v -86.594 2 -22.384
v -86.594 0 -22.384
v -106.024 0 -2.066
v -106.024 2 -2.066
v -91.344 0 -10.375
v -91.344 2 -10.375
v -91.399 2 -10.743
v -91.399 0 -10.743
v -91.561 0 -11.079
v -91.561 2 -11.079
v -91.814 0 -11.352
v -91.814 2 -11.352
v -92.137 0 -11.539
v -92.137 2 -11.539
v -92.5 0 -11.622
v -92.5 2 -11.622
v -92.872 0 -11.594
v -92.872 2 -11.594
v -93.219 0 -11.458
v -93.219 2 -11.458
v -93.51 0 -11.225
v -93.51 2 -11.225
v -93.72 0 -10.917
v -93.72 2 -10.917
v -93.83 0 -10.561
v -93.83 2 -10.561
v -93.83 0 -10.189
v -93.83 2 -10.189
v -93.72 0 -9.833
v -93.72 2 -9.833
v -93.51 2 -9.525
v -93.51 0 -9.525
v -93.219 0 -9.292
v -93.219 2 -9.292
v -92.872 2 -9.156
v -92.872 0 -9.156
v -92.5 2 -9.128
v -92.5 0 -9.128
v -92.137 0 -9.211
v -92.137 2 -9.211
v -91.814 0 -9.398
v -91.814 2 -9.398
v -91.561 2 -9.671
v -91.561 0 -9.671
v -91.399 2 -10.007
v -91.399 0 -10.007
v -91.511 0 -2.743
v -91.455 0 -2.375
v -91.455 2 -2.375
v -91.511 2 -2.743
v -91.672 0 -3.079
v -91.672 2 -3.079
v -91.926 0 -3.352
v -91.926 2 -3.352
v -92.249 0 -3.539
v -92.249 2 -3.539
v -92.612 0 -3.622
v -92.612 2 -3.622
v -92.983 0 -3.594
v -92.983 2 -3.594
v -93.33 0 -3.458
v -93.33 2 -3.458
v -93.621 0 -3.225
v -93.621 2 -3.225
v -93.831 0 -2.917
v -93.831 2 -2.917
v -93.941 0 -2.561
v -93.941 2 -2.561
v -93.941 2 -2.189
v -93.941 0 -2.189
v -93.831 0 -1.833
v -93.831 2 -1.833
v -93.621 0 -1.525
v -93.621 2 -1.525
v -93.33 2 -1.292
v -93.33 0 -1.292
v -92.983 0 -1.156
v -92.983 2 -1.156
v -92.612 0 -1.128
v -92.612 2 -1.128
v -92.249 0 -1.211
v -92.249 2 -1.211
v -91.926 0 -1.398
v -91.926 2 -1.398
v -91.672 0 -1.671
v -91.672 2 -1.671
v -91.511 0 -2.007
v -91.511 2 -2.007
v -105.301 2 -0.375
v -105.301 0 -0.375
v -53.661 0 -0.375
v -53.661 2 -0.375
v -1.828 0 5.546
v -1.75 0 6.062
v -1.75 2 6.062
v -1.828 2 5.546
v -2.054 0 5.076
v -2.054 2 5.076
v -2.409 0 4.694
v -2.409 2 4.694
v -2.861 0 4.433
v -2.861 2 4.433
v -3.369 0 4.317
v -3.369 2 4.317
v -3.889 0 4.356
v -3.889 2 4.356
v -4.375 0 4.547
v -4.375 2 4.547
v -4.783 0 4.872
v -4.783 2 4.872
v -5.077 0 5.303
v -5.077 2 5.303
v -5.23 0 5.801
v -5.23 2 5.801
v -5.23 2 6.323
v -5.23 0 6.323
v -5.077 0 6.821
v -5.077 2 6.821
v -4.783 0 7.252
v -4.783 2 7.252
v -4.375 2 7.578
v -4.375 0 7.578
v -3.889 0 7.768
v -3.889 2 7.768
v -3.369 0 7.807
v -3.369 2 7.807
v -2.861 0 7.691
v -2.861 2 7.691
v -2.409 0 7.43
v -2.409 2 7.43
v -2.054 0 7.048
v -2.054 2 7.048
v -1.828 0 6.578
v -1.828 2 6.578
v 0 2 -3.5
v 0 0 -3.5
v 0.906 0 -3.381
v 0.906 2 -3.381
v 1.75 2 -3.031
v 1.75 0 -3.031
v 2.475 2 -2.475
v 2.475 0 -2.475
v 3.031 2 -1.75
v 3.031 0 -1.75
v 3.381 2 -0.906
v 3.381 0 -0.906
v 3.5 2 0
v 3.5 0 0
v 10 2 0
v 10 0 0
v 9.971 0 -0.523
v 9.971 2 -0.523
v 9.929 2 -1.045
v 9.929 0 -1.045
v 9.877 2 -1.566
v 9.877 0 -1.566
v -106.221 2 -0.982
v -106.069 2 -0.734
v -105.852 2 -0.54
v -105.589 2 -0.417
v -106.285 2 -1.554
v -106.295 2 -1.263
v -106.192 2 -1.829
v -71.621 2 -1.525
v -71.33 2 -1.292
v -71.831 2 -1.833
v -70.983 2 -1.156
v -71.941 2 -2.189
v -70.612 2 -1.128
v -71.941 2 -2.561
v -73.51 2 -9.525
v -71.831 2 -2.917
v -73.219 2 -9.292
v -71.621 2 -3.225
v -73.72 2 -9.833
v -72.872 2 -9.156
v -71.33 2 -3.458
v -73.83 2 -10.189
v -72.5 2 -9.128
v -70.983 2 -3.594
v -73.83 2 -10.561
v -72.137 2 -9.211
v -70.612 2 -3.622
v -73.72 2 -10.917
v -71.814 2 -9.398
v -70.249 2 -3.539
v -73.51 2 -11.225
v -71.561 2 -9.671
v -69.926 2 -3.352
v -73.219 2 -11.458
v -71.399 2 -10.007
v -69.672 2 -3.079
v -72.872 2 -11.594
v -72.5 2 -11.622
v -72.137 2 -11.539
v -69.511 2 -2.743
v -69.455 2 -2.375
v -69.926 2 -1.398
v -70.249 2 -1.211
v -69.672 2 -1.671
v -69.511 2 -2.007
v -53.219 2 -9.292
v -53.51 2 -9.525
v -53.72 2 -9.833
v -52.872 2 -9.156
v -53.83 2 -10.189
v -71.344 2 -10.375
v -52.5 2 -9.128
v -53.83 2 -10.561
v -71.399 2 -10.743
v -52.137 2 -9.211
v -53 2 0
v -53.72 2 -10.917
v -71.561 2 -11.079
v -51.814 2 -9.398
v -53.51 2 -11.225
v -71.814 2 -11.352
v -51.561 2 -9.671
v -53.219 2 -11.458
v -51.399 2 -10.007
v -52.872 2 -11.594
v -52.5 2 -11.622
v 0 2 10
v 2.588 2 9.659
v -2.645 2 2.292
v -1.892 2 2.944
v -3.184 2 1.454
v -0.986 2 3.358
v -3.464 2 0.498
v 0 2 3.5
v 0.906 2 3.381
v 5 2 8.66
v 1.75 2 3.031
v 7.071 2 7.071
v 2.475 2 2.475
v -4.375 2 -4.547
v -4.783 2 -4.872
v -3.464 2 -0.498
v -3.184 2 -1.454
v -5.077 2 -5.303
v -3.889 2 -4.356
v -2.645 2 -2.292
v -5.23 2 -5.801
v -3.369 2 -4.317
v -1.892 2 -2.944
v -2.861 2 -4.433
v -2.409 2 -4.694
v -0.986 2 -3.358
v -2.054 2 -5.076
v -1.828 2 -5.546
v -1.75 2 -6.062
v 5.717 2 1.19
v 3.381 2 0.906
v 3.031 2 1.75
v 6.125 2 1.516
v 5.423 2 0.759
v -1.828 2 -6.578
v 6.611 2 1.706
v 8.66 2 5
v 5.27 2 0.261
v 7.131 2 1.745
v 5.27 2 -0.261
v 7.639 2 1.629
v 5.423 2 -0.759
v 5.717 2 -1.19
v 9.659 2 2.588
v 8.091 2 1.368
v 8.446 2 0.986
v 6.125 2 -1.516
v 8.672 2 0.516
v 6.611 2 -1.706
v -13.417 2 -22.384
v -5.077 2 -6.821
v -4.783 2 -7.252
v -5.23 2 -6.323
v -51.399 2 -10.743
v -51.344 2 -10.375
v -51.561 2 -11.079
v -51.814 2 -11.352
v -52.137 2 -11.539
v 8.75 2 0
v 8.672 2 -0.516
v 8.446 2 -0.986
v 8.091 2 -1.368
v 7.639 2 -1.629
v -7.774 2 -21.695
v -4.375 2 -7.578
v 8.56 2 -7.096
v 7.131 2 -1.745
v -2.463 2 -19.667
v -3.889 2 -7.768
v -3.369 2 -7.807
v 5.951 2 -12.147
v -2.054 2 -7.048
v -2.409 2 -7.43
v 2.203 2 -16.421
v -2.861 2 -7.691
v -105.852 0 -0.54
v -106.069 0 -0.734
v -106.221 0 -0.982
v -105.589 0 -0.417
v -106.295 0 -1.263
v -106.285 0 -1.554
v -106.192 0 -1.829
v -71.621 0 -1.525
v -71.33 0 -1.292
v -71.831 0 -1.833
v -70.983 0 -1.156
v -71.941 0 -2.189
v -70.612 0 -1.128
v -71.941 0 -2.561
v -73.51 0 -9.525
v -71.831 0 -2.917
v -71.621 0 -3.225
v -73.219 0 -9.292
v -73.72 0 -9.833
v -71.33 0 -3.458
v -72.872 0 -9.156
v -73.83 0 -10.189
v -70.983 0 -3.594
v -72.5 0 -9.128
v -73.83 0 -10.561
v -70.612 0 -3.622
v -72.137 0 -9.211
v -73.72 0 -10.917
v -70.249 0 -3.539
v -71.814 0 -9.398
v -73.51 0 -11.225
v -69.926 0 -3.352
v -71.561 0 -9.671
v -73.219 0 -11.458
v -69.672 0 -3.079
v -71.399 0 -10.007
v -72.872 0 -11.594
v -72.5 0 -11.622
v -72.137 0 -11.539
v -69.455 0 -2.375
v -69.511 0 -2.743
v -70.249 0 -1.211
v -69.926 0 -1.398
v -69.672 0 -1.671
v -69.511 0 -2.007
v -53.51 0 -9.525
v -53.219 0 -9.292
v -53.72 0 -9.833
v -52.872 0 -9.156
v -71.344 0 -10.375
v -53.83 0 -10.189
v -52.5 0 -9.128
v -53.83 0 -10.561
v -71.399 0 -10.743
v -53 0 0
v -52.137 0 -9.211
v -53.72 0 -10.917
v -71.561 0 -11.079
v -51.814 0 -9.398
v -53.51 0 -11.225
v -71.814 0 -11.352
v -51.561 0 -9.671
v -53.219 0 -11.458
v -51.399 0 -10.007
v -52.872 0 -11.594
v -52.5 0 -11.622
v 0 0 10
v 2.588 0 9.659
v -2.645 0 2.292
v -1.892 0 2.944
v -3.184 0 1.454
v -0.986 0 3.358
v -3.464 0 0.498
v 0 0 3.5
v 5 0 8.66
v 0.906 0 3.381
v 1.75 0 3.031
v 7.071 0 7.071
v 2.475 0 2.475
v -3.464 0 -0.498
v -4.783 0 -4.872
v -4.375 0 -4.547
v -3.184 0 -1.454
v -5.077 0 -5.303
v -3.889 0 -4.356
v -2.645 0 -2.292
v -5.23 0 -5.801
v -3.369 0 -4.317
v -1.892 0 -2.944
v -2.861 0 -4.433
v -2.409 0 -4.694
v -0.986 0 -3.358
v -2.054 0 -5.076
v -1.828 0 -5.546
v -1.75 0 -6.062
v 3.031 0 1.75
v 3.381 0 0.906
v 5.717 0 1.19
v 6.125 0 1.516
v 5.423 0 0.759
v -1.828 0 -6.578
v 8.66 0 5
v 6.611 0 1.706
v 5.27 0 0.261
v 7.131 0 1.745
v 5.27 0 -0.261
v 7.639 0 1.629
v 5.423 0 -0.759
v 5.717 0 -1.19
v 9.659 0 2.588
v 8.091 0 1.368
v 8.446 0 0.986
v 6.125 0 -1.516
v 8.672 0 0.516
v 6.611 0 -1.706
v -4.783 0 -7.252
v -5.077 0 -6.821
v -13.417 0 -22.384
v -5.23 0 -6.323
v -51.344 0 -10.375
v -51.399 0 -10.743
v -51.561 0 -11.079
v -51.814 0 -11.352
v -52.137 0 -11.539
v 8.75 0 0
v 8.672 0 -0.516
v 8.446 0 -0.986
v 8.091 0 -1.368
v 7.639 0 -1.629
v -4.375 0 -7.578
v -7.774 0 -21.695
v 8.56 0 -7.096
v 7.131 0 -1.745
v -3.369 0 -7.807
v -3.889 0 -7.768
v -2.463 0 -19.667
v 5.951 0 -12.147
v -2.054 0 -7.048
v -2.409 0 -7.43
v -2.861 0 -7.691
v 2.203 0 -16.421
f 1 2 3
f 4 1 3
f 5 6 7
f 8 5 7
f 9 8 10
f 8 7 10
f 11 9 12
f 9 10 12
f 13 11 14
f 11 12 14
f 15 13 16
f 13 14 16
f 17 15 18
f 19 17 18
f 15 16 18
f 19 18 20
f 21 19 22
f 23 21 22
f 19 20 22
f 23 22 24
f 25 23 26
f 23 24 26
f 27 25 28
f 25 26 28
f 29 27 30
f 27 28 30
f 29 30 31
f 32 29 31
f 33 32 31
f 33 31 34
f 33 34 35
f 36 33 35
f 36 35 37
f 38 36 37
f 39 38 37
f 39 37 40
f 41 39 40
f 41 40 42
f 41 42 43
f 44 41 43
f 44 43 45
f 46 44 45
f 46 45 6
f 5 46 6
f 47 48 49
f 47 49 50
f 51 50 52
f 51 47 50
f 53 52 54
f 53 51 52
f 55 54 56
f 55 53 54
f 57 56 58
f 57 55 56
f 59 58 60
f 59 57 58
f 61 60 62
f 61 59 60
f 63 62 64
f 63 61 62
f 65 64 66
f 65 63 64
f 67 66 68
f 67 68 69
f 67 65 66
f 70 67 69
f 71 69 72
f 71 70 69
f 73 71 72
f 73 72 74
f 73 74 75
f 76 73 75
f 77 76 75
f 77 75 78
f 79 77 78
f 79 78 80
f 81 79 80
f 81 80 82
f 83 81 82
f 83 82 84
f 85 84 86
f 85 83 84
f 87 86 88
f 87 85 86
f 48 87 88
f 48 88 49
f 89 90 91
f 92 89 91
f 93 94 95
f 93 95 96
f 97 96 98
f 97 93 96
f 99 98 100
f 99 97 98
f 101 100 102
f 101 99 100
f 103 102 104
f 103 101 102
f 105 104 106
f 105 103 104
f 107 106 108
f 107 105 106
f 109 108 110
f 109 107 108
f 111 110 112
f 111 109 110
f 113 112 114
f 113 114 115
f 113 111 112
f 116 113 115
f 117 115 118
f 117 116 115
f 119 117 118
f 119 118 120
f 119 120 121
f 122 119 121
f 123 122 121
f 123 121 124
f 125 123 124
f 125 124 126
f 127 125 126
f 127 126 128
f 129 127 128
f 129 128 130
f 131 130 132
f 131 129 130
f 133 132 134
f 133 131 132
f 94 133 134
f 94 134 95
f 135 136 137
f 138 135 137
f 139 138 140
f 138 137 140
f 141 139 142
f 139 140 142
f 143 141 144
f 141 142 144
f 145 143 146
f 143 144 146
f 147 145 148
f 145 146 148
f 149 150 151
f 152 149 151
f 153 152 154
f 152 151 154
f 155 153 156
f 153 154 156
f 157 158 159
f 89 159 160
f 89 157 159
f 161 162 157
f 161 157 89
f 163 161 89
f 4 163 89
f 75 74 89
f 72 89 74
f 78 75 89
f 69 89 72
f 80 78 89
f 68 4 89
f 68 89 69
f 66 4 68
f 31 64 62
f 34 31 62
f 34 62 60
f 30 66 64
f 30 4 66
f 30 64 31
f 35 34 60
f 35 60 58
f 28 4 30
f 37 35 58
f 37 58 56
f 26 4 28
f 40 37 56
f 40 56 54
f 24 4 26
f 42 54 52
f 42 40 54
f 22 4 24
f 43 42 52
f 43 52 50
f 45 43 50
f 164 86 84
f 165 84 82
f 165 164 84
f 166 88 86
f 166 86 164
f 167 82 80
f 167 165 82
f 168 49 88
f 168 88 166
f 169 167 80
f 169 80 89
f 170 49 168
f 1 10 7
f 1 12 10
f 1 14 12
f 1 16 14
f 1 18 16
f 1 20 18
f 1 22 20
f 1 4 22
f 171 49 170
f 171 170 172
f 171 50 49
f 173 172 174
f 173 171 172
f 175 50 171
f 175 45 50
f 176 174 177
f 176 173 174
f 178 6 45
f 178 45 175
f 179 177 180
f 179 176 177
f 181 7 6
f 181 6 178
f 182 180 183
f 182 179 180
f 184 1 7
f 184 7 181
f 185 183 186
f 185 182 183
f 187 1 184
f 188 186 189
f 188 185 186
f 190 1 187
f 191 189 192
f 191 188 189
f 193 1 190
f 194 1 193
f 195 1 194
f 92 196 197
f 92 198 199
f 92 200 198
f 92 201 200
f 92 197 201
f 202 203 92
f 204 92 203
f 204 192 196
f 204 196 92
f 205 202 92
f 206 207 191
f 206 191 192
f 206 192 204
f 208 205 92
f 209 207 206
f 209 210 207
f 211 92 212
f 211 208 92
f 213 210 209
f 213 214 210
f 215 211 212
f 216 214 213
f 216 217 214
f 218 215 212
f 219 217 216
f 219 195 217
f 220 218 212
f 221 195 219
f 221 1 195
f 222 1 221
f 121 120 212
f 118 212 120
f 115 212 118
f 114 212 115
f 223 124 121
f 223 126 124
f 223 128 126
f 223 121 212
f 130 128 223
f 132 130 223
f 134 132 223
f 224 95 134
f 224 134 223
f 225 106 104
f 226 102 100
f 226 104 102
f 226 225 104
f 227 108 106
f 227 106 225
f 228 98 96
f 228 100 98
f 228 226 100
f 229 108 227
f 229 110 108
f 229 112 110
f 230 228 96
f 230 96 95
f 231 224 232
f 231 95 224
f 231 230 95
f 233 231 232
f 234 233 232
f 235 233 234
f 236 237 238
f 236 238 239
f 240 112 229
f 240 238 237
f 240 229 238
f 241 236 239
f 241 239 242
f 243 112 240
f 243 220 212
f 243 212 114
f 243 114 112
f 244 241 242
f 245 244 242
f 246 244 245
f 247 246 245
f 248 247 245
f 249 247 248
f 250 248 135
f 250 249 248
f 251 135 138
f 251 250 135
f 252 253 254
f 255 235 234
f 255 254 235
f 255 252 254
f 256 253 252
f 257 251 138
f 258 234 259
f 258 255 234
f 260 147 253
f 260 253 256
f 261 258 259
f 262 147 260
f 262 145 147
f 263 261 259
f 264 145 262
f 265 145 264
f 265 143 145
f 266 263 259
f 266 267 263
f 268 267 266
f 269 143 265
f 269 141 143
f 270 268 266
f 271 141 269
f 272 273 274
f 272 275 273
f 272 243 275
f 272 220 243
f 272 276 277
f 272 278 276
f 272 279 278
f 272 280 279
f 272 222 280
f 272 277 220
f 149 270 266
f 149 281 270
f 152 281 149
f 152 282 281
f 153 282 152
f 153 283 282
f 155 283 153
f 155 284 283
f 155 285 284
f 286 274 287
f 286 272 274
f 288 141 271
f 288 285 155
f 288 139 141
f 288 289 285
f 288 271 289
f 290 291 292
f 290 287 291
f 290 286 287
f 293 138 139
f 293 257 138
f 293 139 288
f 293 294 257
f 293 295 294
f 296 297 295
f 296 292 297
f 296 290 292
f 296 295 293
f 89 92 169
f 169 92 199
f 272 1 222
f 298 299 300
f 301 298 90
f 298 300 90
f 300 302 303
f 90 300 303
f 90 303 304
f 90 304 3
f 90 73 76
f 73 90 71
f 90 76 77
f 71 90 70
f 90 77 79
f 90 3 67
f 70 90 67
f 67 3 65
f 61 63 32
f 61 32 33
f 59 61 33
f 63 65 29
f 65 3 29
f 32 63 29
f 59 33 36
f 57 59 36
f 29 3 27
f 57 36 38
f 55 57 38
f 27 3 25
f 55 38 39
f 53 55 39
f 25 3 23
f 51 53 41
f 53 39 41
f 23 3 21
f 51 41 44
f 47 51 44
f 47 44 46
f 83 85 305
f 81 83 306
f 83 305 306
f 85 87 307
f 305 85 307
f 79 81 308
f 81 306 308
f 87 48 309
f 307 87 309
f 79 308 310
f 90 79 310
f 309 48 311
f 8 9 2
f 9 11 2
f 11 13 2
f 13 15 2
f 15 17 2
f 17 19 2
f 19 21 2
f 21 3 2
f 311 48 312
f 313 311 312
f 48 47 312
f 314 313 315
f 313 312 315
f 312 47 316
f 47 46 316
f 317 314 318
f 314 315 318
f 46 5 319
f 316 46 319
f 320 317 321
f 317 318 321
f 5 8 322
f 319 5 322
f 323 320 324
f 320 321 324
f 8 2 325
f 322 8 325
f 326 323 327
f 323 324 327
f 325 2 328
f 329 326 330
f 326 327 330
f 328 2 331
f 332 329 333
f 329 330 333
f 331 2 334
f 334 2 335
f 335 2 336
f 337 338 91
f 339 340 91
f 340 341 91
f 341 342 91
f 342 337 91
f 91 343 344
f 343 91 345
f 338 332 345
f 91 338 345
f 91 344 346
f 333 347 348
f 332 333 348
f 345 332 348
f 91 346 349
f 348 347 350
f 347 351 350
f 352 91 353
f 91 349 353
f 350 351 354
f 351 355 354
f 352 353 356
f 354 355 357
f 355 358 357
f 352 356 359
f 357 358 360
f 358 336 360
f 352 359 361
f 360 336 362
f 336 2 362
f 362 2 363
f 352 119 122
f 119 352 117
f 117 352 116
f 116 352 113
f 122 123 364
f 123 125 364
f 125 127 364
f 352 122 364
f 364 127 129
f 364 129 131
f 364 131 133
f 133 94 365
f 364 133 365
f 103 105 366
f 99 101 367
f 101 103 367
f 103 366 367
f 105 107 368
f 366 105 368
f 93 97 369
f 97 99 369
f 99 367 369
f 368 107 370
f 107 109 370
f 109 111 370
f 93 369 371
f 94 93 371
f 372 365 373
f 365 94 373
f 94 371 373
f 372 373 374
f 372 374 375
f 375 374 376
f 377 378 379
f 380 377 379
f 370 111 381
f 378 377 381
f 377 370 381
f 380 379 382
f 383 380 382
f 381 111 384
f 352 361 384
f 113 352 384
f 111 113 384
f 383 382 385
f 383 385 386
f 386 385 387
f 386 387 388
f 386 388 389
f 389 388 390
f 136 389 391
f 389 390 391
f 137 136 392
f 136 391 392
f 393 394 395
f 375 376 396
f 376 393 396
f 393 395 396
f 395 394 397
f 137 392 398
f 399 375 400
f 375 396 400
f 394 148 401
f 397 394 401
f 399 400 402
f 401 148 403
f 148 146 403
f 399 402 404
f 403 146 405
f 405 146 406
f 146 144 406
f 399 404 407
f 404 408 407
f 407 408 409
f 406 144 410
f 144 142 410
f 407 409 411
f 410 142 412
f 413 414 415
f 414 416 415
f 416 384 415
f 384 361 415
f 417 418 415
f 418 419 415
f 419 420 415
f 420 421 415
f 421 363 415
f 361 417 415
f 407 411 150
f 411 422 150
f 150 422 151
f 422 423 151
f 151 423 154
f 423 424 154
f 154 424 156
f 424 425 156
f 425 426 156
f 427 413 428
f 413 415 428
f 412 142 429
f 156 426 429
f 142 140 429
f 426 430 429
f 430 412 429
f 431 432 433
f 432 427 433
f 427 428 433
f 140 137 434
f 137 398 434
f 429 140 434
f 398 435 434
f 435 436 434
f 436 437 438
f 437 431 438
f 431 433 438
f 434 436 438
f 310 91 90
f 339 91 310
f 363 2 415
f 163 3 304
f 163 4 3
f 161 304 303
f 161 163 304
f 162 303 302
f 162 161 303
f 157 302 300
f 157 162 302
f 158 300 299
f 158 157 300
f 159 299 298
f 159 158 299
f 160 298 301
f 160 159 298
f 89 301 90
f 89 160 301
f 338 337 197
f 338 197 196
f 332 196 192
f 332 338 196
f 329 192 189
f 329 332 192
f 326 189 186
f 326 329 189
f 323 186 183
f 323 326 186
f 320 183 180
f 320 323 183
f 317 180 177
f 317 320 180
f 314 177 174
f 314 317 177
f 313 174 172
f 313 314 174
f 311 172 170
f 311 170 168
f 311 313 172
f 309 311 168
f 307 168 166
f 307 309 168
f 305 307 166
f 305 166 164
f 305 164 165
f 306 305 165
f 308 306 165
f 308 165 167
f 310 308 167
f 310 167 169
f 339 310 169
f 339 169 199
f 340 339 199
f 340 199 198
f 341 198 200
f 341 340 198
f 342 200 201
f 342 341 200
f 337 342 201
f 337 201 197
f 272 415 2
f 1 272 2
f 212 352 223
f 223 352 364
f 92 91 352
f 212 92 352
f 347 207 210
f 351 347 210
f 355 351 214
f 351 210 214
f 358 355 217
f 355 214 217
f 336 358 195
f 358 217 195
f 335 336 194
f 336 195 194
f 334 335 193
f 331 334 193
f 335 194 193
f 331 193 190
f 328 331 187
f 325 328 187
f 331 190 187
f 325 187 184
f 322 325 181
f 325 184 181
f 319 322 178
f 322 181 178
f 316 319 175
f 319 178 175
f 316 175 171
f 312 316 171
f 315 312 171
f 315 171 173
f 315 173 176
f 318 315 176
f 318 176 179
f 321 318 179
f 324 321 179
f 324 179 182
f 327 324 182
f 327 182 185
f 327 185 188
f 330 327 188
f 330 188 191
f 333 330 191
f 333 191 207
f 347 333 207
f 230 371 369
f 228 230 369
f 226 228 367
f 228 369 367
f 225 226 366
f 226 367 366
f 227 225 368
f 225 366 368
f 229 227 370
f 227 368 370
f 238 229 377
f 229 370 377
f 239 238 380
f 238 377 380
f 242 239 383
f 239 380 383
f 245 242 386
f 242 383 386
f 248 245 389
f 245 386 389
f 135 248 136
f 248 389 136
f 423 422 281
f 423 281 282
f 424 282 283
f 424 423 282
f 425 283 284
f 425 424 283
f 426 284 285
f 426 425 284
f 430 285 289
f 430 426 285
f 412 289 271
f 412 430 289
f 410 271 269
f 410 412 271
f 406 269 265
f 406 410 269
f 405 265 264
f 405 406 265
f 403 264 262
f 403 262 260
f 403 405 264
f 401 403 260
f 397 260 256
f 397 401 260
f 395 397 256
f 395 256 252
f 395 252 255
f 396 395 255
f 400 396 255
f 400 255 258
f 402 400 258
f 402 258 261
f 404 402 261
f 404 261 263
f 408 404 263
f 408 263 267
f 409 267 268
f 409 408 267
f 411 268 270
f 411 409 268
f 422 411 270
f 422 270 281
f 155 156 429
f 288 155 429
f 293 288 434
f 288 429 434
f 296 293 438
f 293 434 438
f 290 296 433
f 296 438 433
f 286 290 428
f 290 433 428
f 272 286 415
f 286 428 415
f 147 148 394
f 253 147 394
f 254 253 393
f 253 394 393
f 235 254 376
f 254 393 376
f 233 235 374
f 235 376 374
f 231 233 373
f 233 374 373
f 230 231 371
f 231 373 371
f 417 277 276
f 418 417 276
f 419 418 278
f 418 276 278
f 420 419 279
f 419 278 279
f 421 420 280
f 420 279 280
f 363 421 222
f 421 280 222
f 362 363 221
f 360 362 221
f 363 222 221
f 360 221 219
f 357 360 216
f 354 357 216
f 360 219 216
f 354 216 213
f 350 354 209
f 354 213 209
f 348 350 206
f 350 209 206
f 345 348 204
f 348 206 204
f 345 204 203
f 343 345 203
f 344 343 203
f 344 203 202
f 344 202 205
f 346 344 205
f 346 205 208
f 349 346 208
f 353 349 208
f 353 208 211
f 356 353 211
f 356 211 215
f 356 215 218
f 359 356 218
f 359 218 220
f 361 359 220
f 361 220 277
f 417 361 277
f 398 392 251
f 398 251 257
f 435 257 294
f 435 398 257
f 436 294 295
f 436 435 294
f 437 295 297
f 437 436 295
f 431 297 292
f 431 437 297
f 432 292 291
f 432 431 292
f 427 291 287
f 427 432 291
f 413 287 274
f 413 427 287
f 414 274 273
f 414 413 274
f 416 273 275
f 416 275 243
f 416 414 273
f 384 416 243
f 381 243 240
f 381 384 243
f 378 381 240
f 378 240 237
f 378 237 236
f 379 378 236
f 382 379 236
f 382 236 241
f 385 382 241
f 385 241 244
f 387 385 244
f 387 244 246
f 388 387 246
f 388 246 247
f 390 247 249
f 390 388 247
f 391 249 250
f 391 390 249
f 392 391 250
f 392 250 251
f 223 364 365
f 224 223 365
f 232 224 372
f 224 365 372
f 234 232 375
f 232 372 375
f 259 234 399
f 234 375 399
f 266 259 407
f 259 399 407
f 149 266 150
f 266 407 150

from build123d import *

# Parameters (mm, degrees)
SKETCH1_R                = 1.25
SKETCH1_R_2              = 1.75
BOSS_EXTRUDE1_DEPTH      = 2
FILLET_1_R               = 1
SKETCH_1_R               = 1.25
CUT_EXTRUDE_1_DEPTH      = 1
CUT_EXTRUDE_1_DEPTH_BACK = 3


with BuildPart() as part:
    # Sketch1 → Boss-Extrude1 (new body)
    with BuildSketch(Plane(origin=(0, 0, 0), x_dir=(1, 0, 0), z_dir=(0, 1, 0))):
        with BuildLine():
            Line((-13.417150151, 22.383876488), (-69.977405348, 22.383876488))
            Line((-69.977405348, 22.383876488), (-86.593533576, 22.383876488))
            Line((-86.593533576, 22.383876488), (-107.641374678, 0.375))
            Line((-107.641374678, 0.375), (-53.661481565, 0.375))
            Line((-53.661481565, 0.375), (-53, 0))
            Line((-53, 0), (0, -10))
            Line((0, -10), (0, -3.5))
            ThreePointArc((0, -3.5), (-3.5, 0), (0, 3.5))
            Line((0, 3.5), (0, 10))
            ThreePointArc((0, 10), (6.493821579, 7.604622364), (9.876612161, 1.566056261))
            ThreePointArc((9.876612161, 1.566056261), (2.20319717, 16.421011896), (-13.417150151, 22.383876488))
        make_face()
        with Locations((-92.705183178, 2.375)):
            Circle(SKETCH1_R, mode=Mode.SUBTRACT)
        with Locations((-70.705183178, 2.375)):
            Circle(SKETCH1_R, mode=Mode.SUBTRACT)
        with Locations((-3.5, -6.062177826)):
            Circle(SKETCH1_R_2, mode=Mode.SUBTRACT)
        with Locations((-3.5, 6.062177826)):
            Circle(SKETCH1_R_2, mode=Mode.SUBTRACT)
        with BuildLine():
            ThreePointArc((10, 0), (9.951428515, 0.784062032), (9.876612161, 1.566056261))
            ThreePointArc((9.876612161, 1.566056261), (6.493821579, 7.604622364), (0, 10))
            Line((0, 10), (0, 3.5))
            ThreePointArc((0, 3.5), (2.474873734, 2.474873734), (3.5, 0))
            ThreePointArc((3.5, 0), (2.474873734, -2.474873734), (0, -3.5))
            Line((0, -3.5), (0, -10))
            ThreePointArc((0, -10), (7.071067812, -7.071067812), (10, 0))
        make_face()
        with Locations((7, 0)):
            Circle(SKETCH1_R_2, mode=Mode.SUBTRACT)
    extrude(amount=BOSS_EXTRUDE1_DEPTH)

    # Скругление1
    fillet_1_edges = [part.edges().sort_by_distance(p)[0] for p in [
        (-107.641374678, 1, -0.375),
    ]]
    fillet(fillet_1_edges, radius=FILLET_1_R)

    # Эскиз1 → Вырез-Вытянуть1 (cut, two sides)
    with BuildSketch(Plane(origin=(0, 2, 0), x_dir=(1, 0, 0), z_dir=(0, 1, 0))) as cut_extrude_1_sk:
        with Locations((-92.593533576, 10.375)):
            Circle(SKETCH_1_R)
        with Locations((-72.593533576, 10.375)):
            Circle(SKETCH_1_R)
        with Locations((-52.593533576, 10.375)):
            Circle(SKETCH_1_R)
    extrude(amount=CUT_EXTRUDE_1_DEPTH, mode=Mode.SUBTRACT)
    extrude(cut_extrude_1_sk.sketch, amount=-CUT_EXTRUDE_1_DEPTH_BACK, mode=Mode.SUBTRACT)


solid = part.part
